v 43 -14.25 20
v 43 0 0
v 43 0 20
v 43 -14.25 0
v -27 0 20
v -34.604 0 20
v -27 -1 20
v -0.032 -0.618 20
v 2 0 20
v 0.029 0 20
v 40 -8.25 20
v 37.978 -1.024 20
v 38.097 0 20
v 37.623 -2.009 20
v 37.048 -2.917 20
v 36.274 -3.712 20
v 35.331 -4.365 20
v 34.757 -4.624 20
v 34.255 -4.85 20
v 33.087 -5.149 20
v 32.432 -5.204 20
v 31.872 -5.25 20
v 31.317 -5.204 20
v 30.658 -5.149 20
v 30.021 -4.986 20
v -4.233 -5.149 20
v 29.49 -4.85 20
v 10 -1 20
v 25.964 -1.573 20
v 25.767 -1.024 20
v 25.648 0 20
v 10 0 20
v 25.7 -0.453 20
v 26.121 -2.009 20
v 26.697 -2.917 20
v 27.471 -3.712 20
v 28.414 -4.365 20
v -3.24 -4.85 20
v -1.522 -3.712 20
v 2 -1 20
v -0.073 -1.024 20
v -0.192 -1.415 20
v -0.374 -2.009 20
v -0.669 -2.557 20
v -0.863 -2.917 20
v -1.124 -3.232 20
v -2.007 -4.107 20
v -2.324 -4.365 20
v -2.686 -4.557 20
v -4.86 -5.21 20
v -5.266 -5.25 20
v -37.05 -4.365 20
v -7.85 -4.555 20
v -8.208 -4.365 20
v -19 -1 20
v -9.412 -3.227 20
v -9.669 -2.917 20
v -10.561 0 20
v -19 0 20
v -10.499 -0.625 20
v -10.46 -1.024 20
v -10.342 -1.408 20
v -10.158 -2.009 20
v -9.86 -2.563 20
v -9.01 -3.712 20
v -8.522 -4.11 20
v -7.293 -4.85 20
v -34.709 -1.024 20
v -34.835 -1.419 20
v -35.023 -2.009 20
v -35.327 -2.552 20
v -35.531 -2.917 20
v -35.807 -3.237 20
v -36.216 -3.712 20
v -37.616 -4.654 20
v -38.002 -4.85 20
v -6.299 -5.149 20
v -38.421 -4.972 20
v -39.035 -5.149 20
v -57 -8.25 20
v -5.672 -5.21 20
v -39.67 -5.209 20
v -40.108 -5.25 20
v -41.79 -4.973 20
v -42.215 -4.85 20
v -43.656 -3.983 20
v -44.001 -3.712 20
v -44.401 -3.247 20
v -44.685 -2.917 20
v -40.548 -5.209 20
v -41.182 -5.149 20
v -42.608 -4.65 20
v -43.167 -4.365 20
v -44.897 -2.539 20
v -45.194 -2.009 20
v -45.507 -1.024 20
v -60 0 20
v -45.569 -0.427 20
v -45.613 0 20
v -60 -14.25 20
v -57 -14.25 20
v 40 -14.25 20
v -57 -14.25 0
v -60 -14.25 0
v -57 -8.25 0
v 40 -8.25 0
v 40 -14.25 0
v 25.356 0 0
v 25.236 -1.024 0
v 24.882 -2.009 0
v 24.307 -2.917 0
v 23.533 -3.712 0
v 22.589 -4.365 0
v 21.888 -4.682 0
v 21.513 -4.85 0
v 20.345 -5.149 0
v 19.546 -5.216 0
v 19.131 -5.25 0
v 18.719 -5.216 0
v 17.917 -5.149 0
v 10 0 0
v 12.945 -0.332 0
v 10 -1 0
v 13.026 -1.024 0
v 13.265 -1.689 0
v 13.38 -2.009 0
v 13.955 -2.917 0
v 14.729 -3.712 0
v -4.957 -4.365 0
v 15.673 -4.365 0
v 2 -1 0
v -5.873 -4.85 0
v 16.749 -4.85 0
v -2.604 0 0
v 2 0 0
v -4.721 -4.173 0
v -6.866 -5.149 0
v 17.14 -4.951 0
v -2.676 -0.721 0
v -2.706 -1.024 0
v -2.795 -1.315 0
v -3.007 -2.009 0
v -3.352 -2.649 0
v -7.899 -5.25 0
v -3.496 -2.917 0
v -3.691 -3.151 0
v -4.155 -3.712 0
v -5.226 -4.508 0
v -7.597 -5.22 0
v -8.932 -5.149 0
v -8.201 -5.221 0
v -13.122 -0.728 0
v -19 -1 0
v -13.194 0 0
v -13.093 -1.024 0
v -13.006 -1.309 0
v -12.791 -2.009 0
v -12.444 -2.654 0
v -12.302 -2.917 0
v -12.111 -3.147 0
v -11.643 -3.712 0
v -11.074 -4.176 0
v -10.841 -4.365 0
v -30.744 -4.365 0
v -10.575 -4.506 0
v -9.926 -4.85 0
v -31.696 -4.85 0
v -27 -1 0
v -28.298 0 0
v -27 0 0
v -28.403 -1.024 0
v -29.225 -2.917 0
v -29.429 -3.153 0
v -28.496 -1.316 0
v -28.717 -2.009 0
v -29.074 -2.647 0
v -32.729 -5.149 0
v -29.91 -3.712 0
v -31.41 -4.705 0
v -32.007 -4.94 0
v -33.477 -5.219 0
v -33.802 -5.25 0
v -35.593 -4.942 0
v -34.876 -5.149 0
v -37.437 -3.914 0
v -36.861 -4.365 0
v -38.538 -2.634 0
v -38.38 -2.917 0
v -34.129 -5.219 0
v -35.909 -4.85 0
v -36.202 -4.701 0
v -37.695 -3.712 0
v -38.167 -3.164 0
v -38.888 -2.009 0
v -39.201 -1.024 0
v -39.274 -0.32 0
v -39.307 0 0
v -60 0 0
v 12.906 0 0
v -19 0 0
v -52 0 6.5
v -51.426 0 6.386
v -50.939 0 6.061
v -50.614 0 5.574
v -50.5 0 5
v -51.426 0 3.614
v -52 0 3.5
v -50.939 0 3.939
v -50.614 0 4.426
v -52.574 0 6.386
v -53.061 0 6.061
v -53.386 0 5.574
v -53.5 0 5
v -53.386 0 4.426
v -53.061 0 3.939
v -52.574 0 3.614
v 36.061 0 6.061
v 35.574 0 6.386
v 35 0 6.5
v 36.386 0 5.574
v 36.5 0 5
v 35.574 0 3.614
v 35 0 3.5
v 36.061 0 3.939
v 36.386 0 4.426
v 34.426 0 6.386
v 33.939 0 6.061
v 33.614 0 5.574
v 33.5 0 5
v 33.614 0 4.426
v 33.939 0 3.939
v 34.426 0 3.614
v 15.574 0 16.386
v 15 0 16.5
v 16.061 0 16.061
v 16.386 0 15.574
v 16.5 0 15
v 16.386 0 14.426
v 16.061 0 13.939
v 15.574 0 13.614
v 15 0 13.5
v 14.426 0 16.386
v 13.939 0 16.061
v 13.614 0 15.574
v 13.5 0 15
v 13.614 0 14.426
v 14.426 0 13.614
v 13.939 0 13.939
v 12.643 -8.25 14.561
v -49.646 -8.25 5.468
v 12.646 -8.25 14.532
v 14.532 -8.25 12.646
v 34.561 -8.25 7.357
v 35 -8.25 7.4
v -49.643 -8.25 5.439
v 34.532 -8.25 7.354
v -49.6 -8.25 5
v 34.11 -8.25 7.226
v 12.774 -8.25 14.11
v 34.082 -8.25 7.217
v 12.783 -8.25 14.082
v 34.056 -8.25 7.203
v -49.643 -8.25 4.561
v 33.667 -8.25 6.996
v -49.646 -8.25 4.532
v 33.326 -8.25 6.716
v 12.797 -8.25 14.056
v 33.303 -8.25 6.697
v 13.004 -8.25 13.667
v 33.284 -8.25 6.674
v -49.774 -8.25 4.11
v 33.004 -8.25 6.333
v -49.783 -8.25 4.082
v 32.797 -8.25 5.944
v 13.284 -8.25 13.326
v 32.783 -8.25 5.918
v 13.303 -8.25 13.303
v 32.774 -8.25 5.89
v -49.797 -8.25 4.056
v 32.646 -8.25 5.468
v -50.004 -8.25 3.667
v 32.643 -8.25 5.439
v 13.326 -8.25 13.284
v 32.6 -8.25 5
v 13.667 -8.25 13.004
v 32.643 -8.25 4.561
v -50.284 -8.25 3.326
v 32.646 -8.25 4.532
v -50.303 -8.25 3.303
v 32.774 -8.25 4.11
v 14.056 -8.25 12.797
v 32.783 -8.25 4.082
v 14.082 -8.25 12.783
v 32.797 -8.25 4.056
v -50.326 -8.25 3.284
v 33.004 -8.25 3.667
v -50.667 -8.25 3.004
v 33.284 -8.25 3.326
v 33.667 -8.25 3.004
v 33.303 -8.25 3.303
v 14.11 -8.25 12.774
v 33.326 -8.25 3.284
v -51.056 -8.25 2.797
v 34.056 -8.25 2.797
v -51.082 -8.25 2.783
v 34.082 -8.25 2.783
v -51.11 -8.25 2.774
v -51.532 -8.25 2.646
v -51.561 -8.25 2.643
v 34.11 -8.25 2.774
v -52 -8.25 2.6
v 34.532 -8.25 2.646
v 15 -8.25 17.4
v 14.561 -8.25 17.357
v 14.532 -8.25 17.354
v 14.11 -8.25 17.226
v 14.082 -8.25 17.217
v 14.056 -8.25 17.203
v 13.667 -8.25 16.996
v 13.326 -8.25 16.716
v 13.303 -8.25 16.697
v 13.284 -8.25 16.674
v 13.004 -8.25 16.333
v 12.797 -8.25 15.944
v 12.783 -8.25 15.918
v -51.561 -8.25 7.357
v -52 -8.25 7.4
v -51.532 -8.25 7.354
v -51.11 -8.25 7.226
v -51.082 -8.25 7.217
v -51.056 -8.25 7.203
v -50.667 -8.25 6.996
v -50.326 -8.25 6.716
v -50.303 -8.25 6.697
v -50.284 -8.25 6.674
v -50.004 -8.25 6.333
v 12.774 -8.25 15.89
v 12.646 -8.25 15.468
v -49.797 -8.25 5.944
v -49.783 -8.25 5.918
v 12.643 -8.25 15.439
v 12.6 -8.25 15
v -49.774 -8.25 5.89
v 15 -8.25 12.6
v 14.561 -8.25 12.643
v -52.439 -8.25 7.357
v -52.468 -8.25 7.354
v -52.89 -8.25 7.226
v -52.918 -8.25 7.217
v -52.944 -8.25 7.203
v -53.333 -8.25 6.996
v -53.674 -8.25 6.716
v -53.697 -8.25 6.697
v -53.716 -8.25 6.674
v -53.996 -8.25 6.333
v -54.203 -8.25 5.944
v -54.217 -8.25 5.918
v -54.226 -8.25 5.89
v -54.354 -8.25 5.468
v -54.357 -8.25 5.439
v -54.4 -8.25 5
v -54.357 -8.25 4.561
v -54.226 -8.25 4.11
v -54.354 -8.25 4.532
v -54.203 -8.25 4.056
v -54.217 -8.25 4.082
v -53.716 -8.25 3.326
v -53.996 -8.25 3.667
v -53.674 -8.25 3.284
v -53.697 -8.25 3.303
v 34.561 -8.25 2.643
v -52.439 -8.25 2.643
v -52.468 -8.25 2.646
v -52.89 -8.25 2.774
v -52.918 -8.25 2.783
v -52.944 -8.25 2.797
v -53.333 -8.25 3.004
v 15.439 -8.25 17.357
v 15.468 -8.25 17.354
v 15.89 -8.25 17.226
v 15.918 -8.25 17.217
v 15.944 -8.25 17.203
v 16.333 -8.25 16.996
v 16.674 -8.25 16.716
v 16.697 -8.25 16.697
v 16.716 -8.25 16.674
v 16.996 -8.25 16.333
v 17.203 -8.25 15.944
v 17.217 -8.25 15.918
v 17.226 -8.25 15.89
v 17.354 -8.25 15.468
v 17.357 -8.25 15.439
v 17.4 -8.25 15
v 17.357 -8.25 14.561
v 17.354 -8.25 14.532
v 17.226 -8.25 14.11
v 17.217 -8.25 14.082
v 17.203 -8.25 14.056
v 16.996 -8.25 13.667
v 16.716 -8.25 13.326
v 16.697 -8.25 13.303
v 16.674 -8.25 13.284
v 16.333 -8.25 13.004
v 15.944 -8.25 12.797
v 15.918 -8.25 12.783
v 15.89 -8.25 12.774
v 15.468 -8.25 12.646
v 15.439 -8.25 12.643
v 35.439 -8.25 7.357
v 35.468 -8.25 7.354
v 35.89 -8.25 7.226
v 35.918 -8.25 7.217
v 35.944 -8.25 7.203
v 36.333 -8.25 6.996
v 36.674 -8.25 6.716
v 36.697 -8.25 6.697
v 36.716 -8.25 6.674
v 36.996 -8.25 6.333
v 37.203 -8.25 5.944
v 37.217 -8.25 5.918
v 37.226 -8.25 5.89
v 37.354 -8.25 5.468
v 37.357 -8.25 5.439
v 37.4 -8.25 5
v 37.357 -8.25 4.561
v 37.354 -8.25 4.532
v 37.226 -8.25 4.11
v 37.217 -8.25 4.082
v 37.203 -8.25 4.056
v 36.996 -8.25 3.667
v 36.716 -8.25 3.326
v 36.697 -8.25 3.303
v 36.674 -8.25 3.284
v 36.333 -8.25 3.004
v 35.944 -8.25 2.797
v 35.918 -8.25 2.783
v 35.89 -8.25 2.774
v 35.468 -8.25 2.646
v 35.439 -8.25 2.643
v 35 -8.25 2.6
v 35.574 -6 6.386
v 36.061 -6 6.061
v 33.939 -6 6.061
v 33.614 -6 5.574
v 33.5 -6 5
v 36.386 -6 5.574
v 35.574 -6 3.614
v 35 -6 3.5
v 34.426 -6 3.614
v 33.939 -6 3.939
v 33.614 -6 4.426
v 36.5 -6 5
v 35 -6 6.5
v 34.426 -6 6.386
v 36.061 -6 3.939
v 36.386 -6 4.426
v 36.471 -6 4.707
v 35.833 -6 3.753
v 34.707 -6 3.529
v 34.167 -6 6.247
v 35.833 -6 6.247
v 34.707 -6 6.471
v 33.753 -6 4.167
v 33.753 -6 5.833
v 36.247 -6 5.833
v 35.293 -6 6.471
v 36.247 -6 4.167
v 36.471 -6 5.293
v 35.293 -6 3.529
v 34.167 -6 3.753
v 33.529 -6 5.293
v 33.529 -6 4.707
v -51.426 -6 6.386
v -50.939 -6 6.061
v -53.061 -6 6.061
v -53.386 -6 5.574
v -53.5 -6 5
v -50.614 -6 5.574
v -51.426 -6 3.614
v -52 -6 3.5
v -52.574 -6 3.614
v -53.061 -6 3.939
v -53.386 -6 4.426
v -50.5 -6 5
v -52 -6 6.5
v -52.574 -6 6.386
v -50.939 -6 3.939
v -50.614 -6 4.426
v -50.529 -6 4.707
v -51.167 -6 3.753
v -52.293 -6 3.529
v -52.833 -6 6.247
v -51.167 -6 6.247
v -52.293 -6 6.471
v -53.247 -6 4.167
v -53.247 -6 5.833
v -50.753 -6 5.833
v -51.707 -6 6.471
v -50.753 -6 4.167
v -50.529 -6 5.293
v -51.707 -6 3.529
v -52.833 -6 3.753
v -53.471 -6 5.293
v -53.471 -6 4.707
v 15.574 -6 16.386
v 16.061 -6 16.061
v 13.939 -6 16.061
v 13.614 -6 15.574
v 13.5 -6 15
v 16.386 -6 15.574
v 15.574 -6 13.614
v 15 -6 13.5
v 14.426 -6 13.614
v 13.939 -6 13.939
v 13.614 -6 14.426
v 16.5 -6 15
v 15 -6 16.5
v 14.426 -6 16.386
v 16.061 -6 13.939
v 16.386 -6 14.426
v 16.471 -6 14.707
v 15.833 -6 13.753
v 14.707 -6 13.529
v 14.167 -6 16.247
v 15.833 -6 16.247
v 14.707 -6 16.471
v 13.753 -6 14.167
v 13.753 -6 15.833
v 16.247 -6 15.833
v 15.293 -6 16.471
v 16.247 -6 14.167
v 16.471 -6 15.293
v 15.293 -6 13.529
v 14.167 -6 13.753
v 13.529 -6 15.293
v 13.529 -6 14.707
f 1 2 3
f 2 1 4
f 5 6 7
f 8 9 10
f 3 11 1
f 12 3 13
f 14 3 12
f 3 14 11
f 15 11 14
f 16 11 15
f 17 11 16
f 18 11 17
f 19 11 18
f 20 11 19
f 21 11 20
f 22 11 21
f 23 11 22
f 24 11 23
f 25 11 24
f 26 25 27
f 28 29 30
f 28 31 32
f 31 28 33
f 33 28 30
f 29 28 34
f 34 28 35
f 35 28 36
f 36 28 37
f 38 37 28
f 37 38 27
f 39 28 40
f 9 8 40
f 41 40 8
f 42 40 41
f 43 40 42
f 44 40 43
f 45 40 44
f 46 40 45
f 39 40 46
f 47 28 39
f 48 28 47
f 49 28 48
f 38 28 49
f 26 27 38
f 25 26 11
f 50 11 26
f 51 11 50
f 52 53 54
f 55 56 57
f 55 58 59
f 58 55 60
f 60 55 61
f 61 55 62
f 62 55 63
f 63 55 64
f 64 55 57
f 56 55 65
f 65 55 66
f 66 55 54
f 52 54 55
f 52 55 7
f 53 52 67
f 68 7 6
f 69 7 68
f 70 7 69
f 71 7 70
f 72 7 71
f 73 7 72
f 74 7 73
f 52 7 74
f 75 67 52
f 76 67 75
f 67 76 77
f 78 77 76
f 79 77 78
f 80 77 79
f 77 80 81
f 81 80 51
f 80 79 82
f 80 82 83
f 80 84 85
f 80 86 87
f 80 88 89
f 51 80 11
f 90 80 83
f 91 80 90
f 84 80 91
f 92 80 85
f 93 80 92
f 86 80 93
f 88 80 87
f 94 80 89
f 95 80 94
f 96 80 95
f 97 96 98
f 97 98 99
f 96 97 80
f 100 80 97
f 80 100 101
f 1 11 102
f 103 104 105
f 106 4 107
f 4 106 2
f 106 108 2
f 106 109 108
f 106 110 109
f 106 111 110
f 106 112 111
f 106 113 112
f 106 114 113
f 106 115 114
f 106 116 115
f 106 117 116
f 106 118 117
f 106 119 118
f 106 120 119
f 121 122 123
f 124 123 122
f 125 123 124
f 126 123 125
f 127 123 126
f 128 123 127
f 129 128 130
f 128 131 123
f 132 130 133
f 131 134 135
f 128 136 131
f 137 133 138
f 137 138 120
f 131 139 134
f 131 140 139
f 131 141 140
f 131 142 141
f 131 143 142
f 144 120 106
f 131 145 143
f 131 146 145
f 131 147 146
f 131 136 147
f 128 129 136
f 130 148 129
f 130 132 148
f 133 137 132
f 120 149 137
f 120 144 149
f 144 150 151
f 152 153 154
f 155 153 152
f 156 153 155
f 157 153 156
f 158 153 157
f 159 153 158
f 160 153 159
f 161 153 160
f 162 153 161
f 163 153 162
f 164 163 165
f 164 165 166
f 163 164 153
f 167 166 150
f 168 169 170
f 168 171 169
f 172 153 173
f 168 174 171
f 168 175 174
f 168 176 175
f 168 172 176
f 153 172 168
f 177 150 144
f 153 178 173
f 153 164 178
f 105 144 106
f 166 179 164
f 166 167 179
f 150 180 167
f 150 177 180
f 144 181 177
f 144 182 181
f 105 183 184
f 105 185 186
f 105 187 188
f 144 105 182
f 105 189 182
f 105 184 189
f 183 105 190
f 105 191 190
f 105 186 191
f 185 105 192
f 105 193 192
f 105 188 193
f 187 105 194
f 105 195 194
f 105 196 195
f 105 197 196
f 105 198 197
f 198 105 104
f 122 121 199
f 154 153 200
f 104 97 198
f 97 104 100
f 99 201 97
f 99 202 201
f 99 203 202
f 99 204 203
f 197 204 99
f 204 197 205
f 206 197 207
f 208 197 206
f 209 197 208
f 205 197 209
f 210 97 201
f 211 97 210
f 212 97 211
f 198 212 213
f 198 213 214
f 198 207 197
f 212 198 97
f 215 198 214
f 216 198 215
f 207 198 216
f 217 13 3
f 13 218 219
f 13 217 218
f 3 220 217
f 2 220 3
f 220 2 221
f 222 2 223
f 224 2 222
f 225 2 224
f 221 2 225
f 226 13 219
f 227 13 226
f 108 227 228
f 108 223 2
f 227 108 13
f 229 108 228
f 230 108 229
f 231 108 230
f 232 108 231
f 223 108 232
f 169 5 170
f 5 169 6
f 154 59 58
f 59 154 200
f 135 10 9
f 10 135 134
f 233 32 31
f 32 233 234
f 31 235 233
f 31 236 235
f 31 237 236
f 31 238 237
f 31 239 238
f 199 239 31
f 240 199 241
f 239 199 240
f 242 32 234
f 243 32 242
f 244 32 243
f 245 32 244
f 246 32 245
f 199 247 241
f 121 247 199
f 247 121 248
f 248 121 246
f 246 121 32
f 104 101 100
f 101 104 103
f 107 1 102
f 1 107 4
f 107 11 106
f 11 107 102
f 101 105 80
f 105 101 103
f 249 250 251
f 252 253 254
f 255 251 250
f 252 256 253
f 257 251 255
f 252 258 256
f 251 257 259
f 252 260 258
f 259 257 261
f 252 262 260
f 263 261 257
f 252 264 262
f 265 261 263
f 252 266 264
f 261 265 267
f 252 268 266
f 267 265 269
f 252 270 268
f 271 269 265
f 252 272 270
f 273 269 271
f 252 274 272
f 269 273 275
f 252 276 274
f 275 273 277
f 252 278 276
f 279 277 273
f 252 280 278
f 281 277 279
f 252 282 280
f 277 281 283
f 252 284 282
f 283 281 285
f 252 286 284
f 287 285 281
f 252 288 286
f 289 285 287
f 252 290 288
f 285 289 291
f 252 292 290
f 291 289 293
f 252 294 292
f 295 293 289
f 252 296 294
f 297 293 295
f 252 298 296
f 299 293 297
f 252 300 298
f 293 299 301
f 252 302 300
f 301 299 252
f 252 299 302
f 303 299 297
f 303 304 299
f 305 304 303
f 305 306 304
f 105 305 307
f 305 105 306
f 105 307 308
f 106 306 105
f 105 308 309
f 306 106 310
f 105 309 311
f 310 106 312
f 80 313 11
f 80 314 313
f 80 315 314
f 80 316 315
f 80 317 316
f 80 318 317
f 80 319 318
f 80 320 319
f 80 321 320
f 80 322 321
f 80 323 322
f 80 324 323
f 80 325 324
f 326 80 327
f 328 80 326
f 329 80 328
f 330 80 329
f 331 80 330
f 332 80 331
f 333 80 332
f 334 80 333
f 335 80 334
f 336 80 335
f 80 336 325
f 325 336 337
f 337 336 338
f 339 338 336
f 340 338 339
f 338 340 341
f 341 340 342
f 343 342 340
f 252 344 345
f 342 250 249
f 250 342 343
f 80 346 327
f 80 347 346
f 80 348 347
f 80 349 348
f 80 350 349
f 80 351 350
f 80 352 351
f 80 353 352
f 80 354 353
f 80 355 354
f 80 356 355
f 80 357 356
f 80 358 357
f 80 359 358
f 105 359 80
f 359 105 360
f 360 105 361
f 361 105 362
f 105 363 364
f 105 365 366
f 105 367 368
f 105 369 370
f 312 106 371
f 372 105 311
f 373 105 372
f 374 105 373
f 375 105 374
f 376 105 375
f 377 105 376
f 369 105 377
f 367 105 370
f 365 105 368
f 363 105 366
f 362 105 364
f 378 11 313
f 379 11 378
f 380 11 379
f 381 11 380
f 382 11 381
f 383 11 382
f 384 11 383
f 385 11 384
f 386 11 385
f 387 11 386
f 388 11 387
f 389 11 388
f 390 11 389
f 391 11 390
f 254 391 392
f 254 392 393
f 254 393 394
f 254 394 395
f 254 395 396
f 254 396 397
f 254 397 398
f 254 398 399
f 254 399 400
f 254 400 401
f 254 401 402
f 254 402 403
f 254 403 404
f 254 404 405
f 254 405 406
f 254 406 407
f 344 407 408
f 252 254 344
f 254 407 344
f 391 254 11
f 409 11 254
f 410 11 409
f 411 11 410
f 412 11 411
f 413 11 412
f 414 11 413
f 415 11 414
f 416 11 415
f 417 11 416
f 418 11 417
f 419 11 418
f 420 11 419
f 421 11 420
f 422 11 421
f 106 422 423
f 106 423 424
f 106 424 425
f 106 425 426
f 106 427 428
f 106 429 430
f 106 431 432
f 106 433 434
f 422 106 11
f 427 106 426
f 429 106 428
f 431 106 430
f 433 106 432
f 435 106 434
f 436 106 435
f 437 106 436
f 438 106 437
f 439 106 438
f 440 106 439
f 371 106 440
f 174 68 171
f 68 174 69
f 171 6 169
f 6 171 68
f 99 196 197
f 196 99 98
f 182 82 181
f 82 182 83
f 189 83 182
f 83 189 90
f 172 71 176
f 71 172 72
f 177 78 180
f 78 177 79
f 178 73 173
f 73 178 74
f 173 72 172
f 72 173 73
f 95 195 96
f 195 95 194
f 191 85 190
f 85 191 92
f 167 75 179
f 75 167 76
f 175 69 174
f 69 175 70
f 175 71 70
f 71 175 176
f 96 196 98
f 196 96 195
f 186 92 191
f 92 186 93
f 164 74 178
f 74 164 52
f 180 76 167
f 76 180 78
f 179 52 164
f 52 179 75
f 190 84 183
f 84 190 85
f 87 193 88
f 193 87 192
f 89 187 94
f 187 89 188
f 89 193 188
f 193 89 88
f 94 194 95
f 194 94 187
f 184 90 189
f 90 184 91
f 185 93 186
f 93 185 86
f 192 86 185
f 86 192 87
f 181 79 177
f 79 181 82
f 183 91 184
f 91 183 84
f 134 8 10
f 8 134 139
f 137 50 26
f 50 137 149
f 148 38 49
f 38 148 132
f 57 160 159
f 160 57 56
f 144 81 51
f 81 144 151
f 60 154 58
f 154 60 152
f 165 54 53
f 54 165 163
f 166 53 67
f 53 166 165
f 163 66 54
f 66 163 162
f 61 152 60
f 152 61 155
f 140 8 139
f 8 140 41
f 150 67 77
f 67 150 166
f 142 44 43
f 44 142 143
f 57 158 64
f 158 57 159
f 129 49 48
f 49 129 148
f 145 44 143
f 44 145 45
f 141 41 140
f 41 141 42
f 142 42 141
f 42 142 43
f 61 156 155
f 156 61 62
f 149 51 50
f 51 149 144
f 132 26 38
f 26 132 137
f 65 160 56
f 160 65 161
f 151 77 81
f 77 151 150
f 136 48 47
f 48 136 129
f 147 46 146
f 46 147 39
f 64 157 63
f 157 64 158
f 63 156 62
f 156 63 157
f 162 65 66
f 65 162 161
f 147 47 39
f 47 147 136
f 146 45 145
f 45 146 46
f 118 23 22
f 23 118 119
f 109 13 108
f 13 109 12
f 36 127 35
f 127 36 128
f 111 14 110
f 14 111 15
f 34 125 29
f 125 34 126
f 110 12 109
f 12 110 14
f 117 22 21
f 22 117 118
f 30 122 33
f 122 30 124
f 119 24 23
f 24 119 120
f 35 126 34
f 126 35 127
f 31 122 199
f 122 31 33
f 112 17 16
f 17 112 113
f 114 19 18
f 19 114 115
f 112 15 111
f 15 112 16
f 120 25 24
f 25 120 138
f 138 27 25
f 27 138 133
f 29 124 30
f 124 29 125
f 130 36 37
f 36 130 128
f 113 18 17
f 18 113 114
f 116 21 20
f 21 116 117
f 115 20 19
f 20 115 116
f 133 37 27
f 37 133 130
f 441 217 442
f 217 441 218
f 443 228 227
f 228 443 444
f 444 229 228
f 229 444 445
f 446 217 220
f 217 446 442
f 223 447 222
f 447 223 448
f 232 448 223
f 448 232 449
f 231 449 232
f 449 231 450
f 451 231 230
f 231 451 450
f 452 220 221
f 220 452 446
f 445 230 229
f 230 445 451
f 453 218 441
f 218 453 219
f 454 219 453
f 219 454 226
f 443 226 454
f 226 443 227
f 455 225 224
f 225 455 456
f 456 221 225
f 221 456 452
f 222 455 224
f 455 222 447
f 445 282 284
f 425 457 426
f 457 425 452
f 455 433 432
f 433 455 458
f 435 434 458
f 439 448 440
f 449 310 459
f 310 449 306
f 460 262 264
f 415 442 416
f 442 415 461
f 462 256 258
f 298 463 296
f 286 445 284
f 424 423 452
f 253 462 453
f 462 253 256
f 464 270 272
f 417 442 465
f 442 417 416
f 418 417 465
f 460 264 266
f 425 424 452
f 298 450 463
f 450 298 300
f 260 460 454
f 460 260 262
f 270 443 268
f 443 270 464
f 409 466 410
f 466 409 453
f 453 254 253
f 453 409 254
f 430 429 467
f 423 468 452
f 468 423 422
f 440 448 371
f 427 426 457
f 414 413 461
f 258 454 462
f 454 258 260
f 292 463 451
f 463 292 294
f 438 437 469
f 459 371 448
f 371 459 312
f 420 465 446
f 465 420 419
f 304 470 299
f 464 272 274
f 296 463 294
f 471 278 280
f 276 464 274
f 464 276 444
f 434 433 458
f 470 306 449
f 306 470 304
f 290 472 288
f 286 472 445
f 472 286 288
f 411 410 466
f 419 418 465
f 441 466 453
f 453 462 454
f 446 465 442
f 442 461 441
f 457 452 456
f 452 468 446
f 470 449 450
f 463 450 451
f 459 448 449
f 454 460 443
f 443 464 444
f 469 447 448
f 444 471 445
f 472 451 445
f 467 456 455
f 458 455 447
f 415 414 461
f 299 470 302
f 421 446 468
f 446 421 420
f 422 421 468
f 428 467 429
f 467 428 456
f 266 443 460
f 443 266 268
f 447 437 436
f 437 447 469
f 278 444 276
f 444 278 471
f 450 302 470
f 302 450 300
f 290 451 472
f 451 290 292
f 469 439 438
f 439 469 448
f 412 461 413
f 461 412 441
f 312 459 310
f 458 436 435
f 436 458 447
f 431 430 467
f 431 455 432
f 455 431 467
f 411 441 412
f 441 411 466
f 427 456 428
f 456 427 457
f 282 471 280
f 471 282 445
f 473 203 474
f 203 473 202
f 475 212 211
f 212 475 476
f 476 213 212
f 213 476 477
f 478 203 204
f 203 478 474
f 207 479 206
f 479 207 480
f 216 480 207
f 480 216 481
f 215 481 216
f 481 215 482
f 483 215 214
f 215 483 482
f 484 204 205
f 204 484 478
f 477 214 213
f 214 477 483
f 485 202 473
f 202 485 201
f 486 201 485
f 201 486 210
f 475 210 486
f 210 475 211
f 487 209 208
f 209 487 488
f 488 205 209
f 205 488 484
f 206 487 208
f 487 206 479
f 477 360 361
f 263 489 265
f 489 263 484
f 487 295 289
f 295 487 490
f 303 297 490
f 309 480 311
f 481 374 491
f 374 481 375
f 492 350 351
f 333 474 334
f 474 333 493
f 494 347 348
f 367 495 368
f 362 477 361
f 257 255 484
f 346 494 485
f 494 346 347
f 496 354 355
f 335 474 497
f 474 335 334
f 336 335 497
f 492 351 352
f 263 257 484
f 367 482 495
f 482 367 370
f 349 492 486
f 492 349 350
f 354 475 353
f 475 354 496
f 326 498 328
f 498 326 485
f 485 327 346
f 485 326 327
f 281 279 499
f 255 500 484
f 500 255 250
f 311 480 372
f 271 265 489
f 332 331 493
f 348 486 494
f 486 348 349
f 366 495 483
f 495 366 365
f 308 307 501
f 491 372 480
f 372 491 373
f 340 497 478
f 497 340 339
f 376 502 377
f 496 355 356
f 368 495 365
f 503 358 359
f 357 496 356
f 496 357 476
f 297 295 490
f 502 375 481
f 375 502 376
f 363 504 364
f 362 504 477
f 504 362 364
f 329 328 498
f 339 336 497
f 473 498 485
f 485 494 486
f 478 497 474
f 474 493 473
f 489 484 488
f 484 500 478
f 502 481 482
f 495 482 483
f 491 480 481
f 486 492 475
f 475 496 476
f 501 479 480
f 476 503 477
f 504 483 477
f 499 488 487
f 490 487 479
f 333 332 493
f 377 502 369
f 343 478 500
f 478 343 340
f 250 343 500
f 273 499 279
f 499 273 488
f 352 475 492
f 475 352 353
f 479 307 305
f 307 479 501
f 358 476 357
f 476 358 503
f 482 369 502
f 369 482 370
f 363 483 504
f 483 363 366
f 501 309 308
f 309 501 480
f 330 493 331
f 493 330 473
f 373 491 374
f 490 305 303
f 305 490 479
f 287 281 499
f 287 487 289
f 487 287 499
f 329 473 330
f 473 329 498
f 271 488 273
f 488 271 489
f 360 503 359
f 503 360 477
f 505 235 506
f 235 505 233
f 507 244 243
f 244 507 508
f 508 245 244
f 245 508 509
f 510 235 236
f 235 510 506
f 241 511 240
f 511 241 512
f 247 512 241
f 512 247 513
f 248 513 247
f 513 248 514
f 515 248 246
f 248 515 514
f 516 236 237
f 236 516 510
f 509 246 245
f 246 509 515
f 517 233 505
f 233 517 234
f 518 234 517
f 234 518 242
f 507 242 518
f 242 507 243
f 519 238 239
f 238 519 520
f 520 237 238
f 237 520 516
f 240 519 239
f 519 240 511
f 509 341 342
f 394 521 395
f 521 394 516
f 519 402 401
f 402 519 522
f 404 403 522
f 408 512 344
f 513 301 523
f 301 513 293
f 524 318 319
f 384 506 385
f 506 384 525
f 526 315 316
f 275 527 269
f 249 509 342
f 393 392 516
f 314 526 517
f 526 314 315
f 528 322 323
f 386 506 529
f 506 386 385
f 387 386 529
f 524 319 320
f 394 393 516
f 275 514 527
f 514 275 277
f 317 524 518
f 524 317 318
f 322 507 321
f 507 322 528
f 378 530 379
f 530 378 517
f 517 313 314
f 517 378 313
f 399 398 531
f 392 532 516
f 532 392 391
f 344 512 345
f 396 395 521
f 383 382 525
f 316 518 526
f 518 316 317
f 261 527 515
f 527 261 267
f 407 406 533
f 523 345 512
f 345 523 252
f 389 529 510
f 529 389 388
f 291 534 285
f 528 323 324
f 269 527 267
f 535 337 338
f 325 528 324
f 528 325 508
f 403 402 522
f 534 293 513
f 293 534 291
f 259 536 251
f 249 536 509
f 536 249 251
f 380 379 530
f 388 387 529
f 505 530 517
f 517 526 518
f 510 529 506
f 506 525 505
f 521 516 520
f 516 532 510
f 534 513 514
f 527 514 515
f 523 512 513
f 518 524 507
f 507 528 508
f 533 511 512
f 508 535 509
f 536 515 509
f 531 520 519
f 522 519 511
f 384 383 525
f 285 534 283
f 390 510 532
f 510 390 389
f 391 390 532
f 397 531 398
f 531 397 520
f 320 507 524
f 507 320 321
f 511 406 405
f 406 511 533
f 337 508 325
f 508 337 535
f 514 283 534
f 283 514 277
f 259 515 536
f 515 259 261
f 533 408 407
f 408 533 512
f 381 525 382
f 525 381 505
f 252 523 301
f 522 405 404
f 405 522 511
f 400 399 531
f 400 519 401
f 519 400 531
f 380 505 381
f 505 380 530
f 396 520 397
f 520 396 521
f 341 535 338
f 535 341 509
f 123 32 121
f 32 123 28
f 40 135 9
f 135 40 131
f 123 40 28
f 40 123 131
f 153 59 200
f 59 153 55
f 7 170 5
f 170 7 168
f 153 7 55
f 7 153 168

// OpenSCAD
module rods() {
     rotate([0, 15, 0]) translate([0, 0, -60]) union() {
        rotate([0, -32.5, 0]) cylinder(d=10.5, h=200, center=false, $fn=32);
        rotate([0, -7.5, 0]) cylinder(d=10.5, h=200, center=false, $fn=32);
        translate([-2, 0, 0]) rotate([0, 17.5, 0]) cylinder(d=10.5, h=200, center=false, $fn=32);
    }
}

module screw() {
    union() {
        translate([0, -8.5, 0]) rotate([90, 0, 180]) 
        union() {
            cylinder(d=3, h=19, $fn=16);
            cylinder(d1=5, d2=3, h=2.5, $fn=32);
            translate([0,0,14.1]) linear_extrude(height=3) circle(r=3.75, $fn=6);
        }
    }
}

module screw_a() {
    translate([35, 0, 5]) screw();
}

module screw_b() {
    translate([-52, 0, 5]) screw();
}

module screw_c() {
    translate([15, 0, 15]) screw();
}

module ziptie() {
    cube([8, 2, 100]);
}    

module ziptie_a() {
    translate([2, -1, -50]) ziptie();
}

module ziptie_b() {
    translate([-27, -1, -50]) ziptie();
}

module front() {
    difference() {
        translate([-60, -14.25, 0]) difference() {
            cube([103, 14.25, 20]);
            translate([3, -3, 0]) cube([97, 9, 20]);
        }
        union() {
            rods();
            ziptie_a();
            ziptie_b();
            screw_a();
            screw_b();
            screw_c();
        }
    }
}


module back() {
    difference() {
        translate([-60, 0, 0]) cube([103, 8.5, 20]);
        union() {
            rods();
            ziptie_a();
            ziptie_b();
            screw_a();
            screw_b();
            screw_c();
        }
    }
}

front();
//translate([0, 10, 0]) back();
